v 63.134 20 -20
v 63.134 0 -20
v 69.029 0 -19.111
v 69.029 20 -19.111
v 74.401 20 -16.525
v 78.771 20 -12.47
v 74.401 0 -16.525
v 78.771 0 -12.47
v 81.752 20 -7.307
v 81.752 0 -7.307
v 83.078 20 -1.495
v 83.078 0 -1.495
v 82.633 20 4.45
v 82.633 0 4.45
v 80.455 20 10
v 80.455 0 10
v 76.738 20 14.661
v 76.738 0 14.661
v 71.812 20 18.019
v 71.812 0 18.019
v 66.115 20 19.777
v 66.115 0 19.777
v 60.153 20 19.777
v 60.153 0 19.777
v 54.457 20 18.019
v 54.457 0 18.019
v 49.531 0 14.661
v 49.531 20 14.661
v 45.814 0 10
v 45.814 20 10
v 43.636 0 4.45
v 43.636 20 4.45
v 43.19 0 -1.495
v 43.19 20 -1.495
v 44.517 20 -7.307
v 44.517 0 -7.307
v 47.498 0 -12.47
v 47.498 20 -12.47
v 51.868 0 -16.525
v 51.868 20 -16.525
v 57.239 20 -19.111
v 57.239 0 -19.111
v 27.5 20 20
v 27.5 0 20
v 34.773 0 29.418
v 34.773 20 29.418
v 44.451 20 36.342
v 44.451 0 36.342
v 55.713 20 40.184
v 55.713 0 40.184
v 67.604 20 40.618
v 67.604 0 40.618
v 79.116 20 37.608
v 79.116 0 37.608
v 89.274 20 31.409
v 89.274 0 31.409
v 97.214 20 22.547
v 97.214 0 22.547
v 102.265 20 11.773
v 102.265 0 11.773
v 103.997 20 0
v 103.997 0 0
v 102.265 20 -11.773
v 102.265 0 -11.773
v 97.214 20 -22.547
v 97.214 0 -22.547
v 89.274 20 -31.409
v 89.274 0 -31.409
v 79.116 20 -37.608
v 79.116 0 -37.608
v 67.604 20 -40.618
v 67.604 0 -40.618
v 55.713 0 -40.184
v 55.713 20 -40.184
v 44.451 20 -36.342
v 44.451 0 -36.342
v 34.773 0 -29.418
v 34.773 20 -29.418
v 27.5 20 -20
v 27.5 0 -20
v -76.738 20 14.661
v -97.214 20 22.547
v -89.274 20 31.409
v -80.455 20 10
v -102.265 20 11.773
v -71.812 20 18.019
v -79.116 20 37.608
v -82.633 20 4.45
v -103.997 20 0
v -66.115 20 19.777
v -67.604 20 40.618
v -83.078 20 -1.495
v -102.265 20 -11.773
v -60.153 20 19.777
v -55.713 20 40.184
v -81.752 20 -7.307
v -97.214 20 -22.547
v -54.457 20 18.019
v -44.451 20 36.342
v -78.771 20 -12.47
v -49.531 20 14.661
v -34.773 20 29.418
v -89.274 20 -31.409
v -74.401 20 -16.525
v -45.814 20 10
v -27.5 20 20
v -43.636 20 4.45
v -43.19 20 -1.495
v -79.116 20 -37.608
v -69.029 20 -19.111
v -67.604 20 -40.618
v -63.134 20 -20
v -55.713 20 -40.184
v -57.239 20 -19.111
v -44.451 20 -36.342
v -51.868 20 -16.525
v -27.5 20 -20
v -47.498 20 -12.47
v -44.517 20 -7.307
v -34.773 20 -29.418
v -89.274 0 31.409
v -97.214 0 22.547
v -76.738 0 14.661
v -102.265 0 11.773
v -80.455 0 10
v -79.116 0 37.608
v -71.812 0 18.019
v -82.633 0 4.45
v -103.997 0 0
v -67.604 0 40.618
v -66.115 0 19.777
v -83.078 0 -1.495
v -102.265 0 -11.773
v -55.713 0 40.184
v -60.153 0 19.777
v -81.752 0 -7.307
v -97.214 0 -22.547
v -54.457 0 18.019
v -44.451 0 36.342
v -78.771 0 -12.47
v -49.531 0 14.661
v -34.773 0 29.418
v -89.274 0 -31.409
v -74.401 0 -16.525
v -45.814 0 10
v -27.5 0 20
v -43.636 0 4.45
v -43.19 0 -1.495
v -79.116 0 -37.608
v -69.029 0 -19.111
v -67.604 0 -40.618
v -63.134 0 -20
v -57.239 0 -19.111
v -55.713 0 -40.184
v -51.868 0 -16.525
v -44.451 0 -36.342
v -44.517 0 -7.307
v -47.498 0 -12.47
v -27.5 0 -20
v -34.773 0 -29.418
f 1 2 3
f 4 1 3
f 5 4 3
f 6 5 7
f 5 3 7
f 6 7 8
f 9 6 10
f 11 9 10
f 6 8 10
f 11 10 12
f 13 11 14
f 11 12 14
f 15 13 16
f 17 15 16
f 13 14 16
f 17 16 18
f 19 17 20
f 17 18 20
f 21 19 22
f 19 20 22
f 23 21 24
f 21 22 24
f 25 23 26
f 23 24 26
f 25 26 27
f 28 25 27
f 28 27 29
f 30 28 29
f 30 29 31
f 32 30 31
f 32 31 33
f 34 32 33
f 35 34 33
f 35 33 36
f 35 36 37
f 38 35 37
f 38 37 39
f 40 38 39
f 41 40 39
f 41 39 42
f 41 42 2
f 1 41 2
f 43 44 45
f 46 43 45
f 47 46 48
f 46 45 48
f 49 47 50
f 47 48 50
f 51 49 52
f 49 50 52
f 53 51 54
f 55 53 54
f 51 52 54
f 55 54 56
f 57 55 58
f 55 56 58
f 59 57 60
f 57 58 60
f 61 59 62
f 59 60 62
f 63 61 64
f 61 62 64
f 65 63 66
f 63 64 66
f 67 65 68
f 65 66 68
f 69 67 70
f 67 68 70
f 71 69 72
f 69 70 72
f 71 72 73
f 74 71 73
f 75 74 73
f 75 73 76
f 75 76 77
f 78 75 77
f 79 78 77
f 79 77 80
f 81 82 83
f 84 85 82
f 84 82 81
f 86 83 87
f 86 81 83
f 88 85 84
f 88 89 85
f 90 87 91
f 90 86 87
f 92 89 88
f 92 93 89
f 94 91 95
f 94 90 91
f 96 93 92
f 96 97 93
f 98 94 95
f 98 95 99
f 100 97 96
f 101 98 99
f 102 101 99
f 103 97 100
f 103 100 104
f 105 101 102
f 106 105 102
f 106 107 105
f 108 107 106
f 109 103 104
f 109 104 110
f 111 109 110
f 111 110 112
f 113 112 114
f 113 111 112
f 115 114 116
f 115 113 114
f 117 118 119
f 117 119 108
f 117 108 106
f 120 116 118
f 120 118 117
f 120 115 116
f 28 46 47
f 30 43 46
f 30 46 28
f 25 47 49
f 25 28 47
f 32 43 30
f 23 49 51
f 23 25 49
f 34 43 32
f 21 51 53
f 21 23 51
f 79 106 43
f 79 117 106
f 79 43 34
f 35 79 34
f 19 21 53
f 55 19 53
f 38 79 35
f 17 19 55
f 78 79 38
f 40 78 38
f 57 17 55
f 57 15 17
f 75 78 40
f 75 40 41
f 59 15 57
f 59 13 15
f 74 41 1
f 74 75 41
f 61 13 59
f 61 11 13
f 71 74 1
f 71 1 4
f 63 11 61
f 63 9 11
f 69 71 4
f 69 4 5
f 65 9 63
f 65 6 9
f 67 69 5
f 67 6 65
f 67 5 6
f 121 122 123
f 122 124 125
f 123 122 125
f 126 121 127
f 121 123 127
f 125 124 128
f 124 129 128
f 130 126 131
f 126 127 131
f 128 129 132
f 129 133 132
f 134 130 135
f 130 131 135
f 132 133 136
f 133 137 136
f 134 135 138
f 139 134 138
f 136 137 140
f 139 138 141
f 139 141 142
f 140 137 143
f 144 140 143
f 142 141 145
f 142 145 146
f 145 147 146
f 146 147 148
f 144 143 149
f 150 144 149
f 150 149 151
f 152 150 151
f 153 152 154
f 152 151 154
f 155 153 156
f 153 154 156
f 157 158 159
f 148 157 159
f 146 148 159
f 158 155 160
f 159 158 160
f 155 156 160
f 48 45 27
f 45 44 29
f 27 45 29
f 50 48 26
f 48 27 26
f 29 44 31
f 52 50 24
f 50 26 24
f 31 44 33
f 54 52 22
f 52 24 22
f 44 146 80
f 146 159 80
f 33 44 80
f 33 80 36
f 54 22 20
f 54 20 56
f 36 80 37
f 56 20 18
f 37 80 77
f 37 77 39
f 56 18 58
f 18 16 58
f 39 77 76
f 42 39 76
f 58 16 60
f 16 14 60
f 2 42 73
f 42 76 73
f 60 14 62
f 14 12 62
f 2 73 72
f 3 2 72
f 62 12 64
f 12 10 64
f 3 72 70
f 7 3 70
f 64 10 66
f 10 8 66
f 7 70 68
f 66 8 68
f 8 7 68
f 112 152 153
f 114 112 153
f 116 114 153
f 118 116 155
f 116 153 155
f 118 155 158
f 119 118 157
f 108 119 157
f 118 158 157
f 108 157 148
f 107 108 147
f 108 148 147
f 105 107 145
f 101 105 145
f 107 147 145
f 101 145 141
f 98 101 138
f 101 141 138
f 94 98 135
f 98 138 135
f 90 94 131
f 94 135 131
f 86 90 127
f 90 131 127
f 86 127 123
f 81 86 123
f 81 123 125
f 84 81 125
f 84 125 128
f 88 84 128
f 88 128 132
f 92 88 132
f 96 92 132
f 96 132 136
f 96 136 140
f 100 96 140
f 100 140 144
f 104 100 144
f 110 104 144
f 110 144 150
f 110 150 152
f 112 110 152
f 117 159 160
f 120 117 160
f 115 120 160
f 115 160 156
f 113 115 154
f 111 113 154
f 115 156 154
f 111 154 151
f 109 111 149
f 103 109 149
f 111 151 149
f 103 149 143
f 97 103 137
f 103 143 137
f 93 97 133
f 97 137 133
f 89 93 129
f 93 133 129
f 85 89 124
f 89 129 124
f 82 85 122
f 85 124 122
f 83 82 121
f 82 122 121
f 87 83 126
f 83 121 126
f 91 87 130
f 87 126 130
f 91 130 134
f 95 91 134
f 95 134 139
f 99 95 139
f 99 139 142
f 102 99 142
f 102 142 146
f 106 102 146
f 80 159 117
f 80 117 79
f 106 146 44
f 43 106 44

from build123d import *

# Parameters (mm, degrees)
SKETCH4_R           = 40.863144044
SKETCH4_W           = 55
SKETCH4_H           = 40
BOSS_EXTRUDE1_DEPTH = 20
CUT_EXTRUDE1_REACH  = 115.513
SKETCH6_R           = 20


with BuildPart() as part:
    # Sketch4 → Boss-Extrude1 (new body)
    with BuildSketch(Plane(origin=(0, 0, 0), x_dir=(1, 0, 0), z_dir=(0, 1, 0))):
        with Locations((-63.134204652, 0)):
            Circle(SKETCH4_R)
        with Locations((63.134204652, 0)):
            Circle(SKETCH4_R)
        Rectangle(SKETCH4_W, SKETCH4_H)
    extrude(amount=BOSS_EXTRUDE1_DEPTH)

    # Sketch6 → Cut-Extrude1 (cut, up to next)
    with BuildSketch(Plane.XZ, mode=Mode.PRIVATE) as cut_extrude1_sk1:
        with Locations(Location((-63.134204652, 0, 0), (0, 0, 270))):
            Circle(SKETCH6_R)
    cut_extrude1_tool1 = extrude(cut_extrude1_sk1.sketch, amount=-CUT_EXTRUDE1_REACH, mode=Mode.PRIVATE) & part.part
    # Sketch6 → Cut-Extrude1 (cut, up to next)
    with BuildSketch(Plane.XZ, mode=Mode.PRIVATE) as cut_extrude1_sk2:
        with Locations(Location((63.134204652, 0, 0), (0, 0, 270))):
            Circle(SKETCH6_R)
    cut_extrude1_tool2 = extrude(cut_extrude1_sk2.sketch, amount=-CUT_EXTRUDE1_REACH, mode=Mode.PRIVATE) & part.part
    add(cut_extrude1_tool1.solids().sort_by_distance((-63.134205, 0, 0))[0], mode=Mode.SUBTRACT)
    add(cut_extrude1_tool2.solids().sort_by_distance((63.134205, 0, 0))[0], mode=Mode.SUBTRACT)


solid = part.part
